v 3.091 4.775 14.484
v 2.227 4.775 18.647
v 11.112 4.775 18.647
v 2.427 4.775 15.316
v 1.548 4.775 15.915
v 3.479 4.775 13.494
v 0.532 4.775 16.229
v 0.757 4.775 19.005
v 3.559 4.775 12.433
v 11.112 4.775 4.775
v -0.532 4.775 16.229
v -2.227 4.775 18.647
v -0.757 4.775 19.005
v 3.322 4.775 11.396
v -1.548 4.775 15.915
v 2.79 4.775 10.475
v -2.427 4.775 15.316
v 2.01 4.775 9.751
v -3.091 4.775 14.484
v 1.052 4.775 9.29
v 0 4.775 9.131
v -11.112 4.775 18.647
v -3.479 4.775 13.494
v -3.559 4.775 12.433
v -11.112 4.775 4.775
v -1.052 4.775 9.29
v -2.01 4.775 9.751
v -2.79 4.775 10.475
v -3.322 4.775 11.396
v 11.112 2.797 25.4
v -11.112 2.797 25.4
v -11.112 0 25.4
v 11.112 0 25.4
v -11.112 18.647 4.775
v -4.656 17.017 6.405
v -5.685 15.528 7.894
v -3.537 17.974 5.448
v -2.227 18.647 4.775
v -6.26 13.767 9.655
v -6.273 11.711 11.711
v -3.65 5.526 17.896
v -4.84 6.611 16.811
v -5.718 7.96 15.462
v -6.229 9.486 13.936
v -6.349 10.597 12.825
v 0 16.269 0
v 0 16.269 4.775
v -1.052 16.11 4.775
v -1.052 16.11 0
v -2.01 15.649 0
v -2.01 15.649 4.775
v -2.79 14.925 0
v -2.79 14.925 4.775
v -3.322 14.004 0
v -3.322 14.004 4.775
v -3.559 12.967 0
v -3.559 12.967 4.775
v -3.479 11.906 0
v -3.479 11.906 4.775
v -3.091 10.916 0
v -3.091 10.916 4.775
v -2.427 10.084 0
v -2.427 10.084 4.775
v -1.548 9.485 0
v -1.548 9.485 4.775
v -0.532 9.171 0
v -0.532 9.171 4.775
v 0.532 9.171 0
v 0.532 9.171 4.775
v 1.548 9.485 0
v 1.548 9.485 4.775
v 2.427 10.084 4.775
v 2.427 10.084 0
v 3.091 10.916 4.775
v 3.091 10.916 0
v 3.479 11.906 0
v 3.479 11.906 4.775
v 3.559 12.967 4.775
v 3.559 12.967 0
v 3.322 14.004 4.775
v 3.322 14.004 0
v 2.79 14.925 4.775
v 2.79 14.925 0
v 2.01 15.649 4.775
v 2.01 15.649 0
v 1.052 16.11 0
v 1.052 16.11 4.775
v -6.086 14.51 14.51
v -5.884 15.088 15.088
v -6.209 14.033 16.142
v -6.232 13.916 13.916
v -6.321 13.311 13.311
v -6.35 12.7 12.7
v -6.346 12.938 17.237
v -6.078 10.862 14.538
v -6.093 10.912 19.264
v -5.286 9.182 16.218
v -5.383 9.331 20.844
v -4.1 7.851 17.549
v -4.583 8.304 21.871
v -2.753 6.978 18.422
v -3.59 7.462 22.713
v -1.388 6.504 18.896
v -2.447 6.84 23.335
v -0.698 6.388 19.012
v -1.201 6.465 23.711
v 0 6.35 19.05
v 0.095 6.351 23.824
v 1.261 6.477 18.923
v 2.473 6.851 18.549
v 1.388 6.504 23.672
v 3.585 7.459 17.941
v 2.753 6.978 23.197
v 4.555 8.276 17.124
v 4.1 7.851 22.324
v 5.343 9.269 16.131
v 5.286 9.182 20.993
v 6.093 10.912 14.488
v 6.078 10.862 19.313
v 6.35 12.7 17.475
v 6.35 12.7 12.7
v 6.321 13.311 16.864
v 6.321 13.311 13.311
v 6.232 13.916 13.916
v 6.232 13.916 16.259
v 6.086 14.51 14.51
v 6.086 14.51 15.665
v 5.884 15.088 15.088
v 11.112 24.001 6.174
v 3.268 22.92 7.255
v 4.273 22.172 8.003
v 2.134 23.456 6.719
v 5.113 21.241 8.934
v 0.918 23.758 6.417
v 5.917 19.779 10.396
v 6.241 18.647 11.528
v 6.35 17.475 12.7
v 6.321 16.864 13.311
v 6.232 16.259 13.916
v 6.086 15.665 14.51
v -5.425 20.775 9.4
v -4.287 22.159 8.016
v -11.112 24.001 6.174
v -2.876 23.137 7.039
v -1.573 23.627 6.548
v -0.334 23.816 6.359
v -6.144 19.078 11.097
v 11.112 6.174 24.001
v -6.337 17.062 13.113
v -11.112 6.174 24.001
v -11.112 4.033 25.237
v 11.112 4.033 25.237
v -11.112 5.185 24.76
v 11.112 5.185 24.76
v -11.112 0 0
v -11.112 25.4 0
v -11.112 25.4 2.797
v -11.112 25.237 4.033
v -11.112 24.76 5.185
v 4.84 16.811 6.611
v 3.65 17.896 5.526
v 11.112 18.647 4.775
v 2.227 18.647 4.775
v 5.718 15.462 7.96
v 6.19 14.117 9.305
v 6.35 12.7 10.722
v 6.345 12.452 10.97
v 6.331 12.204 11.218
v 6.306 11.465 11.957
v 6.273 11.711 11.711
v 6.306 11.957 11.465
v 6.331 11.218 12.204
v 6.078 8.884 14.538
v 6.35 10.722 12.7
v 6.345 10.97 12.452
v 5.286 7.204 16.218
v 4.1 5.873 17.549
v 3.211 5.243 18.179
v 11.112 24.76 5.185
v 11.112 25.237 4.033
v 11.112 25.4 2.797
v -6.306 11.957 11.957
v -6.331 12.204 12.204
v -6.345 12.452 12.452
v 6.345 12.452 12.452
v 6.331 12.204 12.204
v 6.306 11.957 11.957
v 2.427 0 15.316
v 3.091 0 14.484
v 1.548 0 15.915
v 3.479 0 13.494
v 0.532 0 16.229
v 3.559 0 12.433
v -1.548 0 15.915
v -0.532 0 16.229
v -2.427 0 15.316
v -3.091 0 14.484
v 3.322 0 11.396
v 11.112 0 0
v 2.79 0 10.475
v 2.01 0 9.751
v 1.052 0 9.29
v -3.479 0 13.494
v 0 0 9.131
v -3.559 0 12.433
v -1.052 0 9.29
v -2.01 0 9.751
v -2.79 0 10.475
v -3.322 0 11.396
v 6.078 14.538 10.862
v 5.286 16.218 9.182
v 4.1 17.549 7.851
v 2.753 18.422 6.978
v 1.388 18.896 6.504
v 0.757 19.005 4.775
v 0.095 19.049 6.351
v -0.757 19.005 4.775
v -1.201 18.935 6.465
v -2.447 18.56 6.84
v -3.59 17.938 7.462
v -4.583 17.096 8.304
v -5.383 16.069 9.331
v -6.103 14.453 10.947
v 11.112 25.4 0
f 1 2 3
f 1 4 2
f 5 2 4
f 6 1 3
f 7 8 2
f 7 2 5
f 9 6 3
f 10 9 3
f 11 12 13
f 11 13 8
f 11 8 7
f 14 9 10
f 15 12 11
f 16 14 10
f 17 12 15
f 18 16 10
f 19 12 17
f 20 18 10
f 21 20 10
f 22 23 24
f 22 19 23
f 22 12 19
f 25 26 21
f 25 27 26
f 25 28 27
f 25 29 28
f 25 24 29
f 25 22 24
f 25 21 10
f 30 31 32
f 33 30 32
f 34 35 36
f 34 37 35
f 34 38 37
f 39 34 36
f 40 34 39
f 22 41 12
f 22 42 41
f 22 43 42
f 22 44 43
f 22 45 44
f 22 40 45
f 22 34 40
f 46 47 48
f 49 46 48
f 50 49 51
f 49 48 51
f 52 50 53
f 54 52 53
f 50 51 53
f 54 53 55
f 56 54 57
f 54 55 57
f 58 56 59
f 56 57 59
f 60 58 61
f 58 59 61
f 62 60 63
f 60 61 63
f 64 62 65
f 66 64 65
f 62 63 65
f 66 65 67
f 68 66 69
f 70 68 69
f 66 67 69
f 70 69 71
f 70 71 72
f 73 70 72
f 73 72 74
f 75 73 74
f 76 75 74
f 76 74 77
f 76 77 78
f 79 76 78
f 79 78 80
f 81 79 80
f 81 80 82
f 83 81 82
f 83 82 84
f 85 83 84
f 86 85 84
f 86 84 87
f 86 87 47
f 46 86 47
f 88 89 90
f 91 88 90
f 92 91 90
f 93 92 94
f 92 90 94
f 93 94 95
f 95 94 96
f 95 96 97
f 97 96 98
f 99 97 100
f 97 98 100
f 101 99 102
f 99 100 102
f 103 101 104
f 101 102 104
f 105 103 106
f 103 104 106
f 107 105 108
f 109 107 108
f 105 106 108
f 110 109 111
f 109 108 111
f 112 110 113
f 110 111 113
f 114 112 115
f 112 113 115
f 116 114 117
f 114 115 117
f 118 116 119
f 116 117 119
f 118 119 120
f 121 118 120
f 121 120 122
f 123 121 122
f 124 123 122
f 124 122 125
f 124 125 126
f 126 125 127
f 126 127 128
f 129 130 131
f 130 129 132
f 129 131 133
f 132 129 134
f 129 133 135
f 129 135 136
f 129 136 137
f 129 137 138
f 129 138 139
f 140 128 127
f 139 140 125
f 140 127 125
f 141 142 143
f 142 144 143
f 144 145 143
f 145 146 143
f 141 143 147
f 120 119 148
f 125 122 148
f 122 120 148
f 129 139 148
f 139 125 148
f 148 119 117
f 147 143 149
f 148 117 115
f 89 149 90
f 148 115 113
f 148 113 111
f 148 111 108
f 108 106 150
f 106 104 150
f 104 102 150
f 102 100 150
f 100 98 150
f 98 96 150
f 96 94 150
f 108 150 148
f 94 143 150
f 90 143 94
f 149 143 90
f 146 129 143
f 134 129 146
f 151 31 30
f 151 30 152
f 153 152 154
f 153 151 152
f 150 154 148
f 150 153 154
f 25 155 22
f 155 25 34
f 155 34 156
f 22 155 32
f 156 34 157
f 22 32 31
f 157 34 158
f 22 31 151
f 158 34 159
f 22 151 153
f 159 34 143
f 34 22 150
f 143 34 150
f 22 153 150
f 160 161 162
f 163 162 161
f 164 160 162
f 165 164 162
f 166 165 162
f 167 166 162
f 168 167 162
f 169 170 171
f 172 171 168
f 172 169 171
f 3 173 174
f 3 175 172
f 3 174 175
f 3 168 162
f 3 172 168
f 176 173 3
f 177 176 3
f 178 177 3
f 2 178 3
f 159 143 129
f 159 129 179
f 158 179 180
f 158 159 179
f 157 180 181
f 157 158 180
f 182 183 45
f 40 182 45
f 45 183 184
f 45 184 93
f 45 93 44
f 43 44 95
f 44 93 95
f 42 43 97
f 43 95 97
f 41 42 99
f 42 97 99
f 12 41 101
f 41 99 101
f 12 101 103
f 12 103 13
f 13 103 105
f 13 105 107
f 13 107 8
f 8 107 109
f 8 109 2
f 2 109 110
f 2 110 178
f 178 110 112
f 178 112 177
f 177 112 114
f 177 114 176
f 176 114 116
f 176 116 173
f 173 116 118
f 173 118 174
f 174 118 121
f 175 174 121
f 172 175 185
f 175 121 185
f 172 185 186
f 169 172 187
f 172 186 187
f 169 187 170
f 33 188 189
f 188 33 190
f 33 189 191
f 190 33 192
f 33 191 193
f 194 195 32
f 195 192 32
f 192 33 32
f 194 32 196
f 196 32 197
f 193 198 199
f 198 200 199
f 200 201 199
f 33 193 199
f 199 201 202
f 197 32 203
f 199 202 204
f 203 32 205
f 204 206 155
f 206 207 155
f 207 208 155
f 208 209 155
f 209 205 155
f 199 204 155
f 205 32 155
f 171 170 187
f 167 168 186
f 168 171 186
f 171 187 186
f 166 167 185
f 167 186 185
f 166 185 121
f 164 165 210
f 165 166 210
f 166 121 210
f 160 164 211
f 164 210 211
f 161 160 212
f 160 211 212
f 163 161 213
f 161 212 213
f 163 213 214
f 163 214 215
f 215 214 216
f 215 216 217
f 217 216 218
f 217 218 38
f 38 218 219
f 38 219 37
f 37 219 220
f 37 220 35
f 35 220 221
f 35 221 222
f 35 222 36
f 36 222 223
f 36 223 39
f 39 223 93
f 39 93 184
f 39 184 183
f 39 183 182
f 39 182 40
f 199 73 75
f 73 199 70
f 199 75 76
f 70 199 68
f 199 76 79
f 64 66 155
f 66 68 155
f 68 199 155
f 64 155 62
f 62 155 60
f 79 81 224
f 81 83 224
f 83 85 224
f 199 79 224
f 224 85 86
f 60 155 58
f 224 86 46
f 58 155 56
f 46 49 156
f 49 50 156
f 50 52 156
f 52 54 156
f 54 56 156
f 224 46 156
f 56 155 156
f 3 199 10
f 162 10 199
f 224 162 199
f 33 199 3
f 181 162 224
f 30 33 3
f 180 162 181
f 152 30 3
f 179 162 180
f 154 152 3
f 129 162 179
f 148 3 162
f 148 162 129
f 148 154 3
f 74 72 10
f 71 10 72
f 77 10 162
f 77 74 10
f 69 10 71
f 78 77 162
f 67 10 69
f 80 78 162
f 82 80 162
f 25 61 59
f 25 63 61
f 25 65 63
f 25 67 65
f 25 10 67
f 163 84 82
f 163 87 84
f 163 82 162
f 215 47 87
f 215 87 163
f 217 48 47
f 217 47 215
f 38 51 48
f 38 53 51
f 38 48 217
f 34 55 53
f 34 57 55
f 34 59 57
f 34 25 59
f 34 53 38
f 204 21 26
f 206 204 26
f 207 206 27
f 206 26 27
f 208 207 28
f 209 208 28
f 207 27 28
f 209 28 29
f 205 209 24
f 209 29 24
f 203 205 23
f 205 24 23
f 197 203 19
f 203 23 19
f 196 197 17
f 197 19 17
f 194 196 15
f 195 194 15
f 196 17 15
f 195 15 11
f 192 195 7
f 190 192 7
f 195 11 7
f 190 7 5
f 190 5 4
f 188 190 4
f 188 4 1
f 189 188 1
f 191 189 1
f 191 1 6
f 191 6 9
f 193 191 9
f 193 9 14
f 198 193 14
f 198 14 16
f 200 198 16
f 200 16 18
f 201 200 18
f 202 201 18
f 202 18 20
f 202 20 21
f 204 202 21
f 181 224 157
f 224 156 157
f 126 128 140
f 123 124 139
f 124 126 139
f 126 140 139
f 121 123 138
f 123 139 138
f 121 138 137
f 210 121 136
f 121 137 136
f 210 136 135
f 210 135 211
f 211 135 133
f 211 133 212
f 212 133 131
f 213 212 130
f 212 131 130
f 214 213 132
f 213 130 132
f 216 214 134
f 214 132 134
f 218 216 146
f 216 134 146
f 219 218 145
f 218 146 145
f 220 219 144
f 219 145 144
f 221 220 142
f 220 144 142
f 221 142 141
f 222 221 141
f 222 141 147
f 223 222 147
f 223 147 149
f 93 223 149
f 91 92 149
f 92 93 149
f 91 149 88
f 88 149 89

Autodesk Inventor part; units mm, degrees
ref_plane "YZ Plane" through (0, 0, 0) normal (1, 0, 0) x (0, 1, 0)
ref_plane "XZ Plane" through (0, 0, 0) normal (0, 1, 0) x (-1, 0, 0)
ref_plane "XY Plane" through (0, 0, 0) normal (0, 0, 1) x (1, 0, 0)
sketch "Sketch_1" plane through (0, 0, 0) normal (1, 0, 0) x (0, 1, 0)
  line L0 (2.7972, 25.4) -> (0, 25.4)
  line L1 (0, 25.4) -> (0, 0)
  line L2 (0, 0) -> (25.4, 0)
  line L3 (25.4, 0) -> (25.4, 2.7972)
  arc A0 (25.4, 2.7972) -> (24.0014, 6.1738) centre (20.6248, 2.7972) ccw
  line L4 (24.0014, 6.1738) -> (6.1738, 24.0014)
  arc A1 (6.1738, 24.0014) -> (2.7972, 25.4) centre (2.7972, 20.6248) ccw
  line L5 (4.7752, 18.6468) -> (4.7752, 4.7752)
  line L6 (4.7752, 4.7752) -> (18.6468, 4.7752)
  line L7 (18.6468, 4.7752) -> (4.7752, 18.6468)
extrude "Extrusion1" add sketch "Sketch_1" along normal mid plane 22.225
sketch "Sketch2" plane through (-11.1125, 0, 25.4) normal (0, -1, 0) x (1, 0, 0)
  point P0 (11.1125, -12.7)
hole "Hole1" at (0, 0, 12.7) direction (0, 1, 0) diameter 7.1374 depth 4.7752
sketch "Sketch3" plane through (11.1125, 0, 0) normal (0, 0, -1) x (-1, 0, 0)
  point P0 (11.1125, 12.7)
hole "Hole2" at (0, 12.7, 0) direction (0, 0, 1) diameter 7.1374 depth 4.7752
sketch "Sketch_4" plane through (0, 0, 25.4) normal (0, 0, 1) x (1, 0, 0)
  circle A0 centre (0, 12.7) radius 6.35
extrude "Extrusion2" cut sketch "Sketch_4" against normal blind 20.6248
sketch "Sketch_5" plane through (0, 25.4, 0) normal (0, 1, 0) x (1, 0, 0)
  circle A0 centre (0, -12.7) radius 6.35
extrude "Extrusion3" cut sketch "Sketch_5" against normal blind 20.6248
properties part number "4132"
